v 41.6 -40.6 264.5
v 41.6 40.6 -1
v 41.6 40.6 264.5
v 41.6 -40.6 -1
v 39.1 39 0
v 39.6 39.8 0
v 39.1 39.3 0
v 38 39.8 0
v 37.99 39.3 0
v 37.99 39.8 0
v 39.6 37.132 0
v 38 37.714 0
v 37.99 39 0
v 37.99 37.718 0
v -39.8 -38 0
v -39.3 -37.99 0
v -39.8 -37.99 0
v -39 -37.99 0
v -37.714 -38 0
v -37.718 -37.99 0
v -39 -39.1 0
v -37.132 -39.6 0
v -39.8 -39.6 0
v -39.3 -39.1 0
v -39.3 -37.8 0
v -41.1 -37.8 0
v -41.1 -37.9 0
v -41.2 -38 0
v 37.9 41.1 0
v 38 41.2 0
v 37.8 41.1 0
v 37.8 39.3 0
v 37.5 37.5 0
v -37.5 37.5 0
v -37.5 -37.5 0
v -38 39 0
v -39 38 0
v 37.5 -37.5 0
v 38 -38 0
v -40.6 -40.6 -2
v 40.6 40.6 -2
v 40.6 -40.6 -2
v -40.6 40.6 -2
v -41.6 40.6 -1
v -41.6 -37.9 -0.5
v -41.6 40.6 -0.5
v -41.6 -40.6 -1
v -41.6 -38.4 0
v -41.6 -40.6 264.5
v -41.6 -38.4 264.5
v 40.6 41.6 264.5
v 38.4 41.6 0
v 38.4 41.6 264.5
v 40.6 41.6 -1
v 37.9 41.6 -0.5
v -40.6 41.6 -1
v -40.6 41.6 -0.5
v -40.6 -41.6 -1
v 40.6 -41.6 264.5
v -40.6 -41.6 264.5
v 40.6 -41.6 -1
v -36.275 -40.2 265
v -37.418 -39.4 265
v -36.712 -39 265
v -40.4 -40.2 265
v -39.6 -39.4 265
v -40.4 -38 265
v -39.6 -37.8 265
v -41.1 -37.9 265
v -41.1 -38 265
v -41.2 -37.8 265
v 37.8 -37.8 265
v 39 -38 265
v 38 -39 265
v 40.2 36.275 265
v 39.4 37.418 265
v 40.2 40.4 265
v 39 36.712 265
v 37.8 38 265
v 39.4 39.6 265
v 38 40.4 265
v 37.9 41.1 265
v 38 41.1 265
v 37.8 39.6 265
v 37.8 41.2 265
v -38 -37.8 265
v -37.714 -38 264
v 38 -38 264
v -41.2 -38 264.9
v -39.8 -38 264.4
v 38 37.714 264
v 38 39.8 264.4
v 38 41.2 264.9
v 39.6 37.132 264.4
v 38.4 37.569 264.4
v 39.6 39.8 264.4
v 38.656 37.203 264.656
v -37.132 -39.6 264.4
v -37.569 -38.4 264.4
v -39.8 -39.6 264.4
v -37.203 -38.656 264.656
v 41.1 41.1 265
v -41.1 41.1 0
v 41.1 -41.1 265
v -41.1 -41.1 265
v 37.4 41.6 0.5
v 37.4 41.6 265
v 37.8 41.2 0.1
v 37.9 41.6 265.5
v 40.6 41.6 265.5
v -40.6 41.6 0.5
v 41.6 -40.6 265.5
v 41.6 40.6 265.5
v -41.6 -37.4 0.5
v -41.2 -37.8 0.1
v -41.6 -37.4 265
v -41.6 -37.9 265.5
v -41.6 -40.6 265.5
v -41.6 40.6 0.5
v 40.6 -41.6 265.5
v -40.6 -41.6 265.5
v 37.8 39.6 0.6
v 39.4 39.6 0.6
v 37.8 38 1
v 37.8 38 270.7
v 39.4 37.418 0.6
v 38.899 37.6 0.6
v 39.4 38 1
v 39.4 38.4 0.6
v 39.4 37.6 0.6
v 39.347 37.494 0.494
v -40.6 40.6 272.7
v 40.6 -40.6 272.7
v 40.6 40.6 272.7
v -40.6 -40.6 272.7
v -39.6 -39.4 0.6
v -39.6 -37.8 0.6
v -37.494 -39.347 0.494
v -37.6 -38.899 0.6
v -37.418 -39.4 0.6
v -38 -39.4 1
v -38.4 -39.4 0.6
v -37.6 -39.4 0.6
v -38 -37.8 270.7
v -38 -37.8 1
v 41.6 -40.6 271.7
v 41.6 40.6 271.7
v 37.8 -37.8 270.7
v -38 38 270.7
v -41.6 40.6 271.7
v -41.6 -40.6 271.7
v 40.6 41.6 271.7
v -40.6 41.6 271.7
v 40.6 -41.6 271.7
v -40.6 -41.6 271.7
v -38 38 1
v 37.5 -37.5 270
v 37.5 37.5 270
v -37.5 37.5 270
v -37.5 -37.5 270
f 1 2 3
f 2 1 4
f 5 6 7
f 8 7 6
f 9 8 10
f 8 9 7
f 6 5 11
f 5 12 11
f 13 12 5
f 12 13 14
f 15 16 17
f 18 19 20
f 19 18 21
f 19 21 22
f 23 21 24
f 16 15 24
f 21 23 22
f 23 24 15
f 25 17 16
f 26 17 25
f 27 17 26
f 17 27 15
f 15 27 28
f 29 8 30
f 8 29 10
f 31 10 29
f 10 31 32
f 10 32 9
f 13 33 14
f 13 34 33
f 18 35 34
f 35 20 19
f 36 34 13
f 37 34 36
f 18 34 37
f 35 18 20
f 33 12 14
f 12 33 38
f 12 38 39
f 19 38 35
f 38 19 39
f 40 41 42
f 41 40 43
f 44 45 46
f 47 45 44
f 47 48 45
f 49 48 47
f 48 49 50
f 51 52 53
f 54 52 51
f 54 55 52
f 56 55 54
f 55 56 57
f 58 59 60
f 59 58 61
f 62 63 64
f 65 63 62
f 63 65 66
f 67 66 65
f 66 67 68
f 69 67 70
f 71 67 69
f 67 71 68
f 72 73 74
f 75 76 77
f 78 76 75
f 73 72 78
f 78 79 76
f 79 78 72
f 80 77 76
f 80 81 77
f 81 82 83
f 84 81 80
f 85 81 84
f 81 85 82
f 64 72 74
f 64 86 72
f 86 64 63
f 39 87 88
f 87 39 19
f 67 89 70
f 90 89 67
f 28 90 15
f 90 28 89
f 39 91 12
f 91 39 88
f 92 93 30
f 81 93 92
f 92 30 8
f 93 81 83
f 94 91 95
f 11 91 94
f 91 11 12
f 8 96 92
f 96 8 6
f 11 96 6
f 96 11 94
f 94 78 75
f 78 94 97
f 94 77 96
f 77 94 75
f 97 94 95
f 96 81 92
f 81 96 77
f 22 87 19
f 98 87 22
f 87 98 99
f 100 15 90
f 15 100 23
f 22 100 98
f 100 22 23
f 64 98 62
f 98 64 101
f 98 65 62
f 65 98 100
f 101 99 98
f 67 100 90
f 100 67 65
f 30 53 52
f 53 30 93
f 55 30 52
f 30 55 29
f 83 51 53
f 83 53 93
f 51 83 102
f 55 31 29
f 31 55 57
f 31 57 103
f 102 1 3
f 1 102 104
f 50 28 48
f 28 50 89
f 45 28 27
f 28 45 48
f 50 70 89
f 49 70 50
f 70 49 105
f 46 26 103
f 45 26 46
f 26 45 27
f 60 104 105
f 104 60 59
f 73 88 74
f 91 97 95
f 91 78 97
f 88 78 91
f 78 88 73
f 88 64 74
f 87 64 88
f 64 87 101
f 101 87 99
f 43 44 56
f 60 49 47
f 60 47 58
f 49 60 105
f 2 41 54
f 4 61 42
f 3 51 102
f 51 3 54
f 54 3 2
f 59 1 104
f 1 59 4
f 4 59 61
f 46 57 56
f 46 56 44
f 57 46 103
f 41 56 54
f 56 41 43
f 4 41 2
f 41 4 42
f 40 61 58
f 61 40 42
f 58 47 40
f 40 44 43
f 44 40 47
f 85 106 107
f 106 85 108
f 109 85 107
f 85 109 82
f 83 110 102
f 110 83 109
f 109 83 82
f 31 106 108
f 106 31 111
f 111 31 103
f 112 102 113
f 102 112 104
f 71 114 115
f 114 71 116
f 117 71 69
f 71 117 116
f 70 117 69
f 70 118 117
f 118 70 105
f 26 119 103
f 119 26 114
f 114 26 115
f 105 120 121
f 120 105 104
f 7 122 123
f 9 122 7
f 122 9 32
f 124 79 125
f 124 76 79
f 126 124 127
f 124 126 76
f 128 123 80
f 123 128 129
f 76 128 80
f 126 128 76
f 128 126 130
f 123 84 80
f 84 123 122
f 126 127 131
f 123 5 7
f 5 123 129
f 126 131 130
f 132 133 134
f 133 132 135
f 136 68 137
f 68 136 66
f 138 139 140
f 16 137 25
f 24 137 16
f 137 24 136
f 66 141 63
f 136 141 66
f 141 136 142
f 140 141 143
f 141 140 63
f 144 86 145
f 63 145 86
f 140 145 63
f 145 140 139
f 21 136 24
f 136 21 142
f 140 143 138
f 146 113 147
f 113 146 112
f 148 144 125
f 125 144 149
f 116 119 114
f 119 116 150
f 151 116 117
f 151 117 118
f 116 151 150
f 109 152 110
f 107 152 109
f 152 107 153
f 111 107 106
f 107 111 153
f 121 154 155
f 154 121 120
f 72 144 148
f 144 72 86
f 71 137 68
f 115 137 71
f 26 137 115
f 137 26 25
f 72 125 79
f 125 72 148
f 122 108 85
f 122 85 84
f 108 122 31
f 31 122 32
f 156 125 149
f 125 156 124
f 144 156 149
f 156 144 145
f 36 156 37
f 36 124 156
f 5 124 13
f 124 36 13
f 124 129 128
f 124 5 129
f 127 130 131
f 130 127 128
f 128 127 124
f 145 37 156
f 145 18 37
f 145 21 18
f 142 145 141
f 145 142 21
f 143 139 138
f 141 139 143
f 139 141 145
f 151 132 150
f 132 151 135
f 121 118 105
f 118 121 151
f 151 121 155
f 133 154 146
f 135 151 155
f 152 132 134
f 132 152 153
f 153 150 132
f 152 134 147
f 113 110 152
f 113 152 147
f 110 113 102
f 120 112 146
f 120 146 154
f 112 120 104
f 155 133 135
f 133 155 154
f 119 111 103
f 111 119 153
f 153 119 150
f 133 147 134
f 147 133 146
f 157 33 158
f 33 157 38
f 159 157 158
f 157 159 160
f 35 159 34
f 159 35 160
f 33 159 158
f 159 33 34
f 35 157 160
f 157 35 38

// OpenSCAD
// Jenga box in two three-sided halves. The stacker is the back and right walls
// plus an end cap, a little shorter than the tower. Cap up, it squares the
// tower in its back-right corner and slides off. Cap down, it holds the blocks,
// and the lid (front and left walls plus the other end cap) slides down onto
// it. A lip on the lid's back and right edges covers the rest of the tower.
//
// A store-bought draw latch holds them together.
//
// Storage orientation: x is right, y is toward the front, z is up. The tower
// stands on the stacker's cap at z = 0.
//
// Print the stacker on its right side and the lid face down. The stacker and lid are output at 45° to fit
// the bed diagonally.

/* [Output] */
part = "assembly"; // [assembly, stack, stacker, lid]
// Lid height above closed, in the assembly view.
lid_raise = 0;

/* [Tower] */
// Measure your own tower; sets vary.
tower_w = 75;
tower_h = 270;
// Per side.
tower_clear = 0.5;
// How much shorter the stacker's walls are than the tower.
stacker_short = 5;

/* [Walls] */
wall = 3.6;
cap_t = 2;
// The lid's wall edges ride in dovetail grooves in the stacker's walls.
tongue_t = 1.6;
groove_depth = 1.6;
// Undercut angle on the groove's inner side.
dovetail = 20;

/* [Edges] */
// Outer edges, and the inner edges at each half's open end.
chamfer = 1;
// V-groove along the outside seams between the halves.
reveal = 0.5;

/* [Fit] */
slide_clear = 0.2;
// Chamfer on the tongue tips and groove mouths.
lead_in = 0.6;

/* [Hidden] */
$fn = 48;

eps = 0.01;
c = slide_clear;
tb = tongue_t;
gd = groove_depth;
li = lead_in;
t_dv = tan(dovetail);

iw = tower_w + 2 * tower_clear;
ih = tower_h + tower_clear;
h = iw / 2;
o = h + wall;
z_s = tower_h - stacker_short;
// Underside of the lid's cap.
z_a = ih + c;
z_top = z_a + cap_t;

assert(tb + c + li < wall && gd + li < wall,
       "tongue_t, groove_depth or lead_in too big for wall");

module box(x, y, z) {
  translate([x[0], y[0], z[0]]) cube([x[1] - x[0], y[1] - y[0], z[1] - z[0]]);
}

// Seam profiles: u runs into the groove from the stacker wall's inner face, s
// across it, with the dovetail side negative.
// The tongue's dovetail side runs from the lid wall's corner at u = -c; the
// groove's is c from it.
function tongue_s(u) = -(u + c) * t_dv;
function groove_s(u) = tongue_s(u) - c / cos(dovetail);
groove_pts = [[-eps, groove_s(-eps)], [gd, groove_s(gd)], [gd, tb + c],
              [-eps, tb + c]];
// Buried in the lid wall behind u = -c.
tongue_pts = [[-c - 1, tongue_s(-c - 1)], [gd - c, tongue_s(gd - c)],
              [gd - c, tb], [-c - 1, tb]];

// Places seam coordinates at the front-right seam and its mirror at back-left.
module at_seams() {
  for (m = [0, 1]) mirror([m, m, 0]) translate([h, h, 0])
    children();
}

// Flared to a lead-in at the wall top.
module groove() {
  linear_extrude(z_s + 1) polygon(groove_pts);
  hull() {
    translate([0, 0, z_s - li]) linear_extrude(eps) polygon(groove_pts);
    translate([0, 0, z_s]) linear_extrude(1) offset(delta = li)
      polygon(groove_pts);
  }
}

// Narrowed to a lead-in at the bottom.
module tongue() {
  hull() {
    translate([0, 0, li]) linear_extrude(z_top - li) polygon(tongue_pts);
    linear_extrude(eps) offset(delta = -li / 2) polygon(tongue_pts);
  }
}

// The closed box's outside, chamfered on every edge.
module envelope() {
  hull() {
    box([-o + chamfer, o - chamfer], [-o + chamfer, o - chamfer], [-cap_t, z_top]);
    box([-o, o], [-o + chamfer, o - chamfer],
        [-cap_t + chamfer, z_top - chamfer]);
    box([-o + chamfer, o - chamfer], [-o, o],
        [-cap_t + chamfer, z_top - chamfer]);
  }
}

// Cuts a 45° chamfer of size r into the edges along a -> b, with pyramid ends
// so that cuts meeting at a corner join cleanly.
module edge_cut(a, b, r) {
  hull() for (p = [a, b]) translate(p)
    polyhedron([[r, 0, 0], [-r, 0, 0], [0, r, 0], [0, -r, 0], [0, 0, r],
                [0, 0, -r]],
               [[0, 2, 4], [2, 1, 4], [1, 3, 4], [3, 0, 4], [2, 0, 5], [1, 2, 5],
                [3, 1, 5], [0, 3, 5]]);
}

// On the front and right faces, and mirrored to the left and back.
module reveals() {
  for (m = [0, 1]) mirror([m, m, 0]) {
    edge_cut([h - c / 2, o, 0], [h - c / 2, o, z_s], reveal);
    edge_cut([h - c / 2, o, z_s], [o, o, z_s], reveal);
    edge_cut([-o, o, 0], [h - c / 2, o, 0], reveal);
    edge_cut([o, -o, z_s], [o, o, z_s], reveal);
  }
}

module stacker() {
  intersection() {
    envelope();
    difference() {
      union() {
        box([-o, o], [-o, o], [-cap_t, 0]);
        box([-o, o], [-o, -h], [-cap_t, z_s]);
        box([h, o], [-o, o], [-cap_t, z_s]);
      }
      // Grooves for the lid's front and left wall edges.
      at_seams() groove();
      reveals();
      // Inner top edges of the right wall, and mirrored, the back wall.
      for (m = [0, 1]) mirror([m, m, 0])
        edge_cut([h, -h, z_s], [h, h, z_s], chamfer);
    }
  }
}

module lid() {
  intersection() {
    envelope();
    difference() {
      union() {
        box([-o, o], [-o, o], [z_a, z_top]);
        // Lip over the stacker's back and right walls.
        box([-o, o], [-o, -h + c], [z_s, z_top]);
        box([h - c, o], [-o, o], [z_s, z_top]);
        // Front and left walls.
        box([-o, h - c], [h, o], [0, z_top]);
        box([-o, -h], [-h + c, o], [0, z_top]);
        at_seams() tongue();
      }
      reveals();
      // Inner bottom edges of the front wall and its tongue, and mirrored, the
      // left wall.
      for (m = [0, 1]) mirror([m, m, 0])
        edge_cut([-h, h, 0], [h + gd - c, h, 0], chamfer);
    }
  }
}

module tower() {
  box([-tower_w / 2, tower_w / 2], [-tower_w / 2, tower_w / 2], [0, tower_h]);
}

if (part == "stacker") {
  rotate([0, 0, 45]) translate([0, 0, o]) rotate([0, 90, 0]) stacker();
} else if (part == "lid") {
  rotate([0, 0, 45]) translate([0, 0, o]) rotate([-90, 0, 0]) lid();
} else if (part == "stack") {
  // Cap up, resting on the tower.
  color("white") translate([0, 0, tower_h]) rotate([0, 180, 0]) stacker();
  color("burlywood", 0.4) tower();
} else {
  color("white") stacker();
  translate([0, 0, lid_raise]) color("lightgray") lid();
  color("burlywood", 0.4) tower();
}
